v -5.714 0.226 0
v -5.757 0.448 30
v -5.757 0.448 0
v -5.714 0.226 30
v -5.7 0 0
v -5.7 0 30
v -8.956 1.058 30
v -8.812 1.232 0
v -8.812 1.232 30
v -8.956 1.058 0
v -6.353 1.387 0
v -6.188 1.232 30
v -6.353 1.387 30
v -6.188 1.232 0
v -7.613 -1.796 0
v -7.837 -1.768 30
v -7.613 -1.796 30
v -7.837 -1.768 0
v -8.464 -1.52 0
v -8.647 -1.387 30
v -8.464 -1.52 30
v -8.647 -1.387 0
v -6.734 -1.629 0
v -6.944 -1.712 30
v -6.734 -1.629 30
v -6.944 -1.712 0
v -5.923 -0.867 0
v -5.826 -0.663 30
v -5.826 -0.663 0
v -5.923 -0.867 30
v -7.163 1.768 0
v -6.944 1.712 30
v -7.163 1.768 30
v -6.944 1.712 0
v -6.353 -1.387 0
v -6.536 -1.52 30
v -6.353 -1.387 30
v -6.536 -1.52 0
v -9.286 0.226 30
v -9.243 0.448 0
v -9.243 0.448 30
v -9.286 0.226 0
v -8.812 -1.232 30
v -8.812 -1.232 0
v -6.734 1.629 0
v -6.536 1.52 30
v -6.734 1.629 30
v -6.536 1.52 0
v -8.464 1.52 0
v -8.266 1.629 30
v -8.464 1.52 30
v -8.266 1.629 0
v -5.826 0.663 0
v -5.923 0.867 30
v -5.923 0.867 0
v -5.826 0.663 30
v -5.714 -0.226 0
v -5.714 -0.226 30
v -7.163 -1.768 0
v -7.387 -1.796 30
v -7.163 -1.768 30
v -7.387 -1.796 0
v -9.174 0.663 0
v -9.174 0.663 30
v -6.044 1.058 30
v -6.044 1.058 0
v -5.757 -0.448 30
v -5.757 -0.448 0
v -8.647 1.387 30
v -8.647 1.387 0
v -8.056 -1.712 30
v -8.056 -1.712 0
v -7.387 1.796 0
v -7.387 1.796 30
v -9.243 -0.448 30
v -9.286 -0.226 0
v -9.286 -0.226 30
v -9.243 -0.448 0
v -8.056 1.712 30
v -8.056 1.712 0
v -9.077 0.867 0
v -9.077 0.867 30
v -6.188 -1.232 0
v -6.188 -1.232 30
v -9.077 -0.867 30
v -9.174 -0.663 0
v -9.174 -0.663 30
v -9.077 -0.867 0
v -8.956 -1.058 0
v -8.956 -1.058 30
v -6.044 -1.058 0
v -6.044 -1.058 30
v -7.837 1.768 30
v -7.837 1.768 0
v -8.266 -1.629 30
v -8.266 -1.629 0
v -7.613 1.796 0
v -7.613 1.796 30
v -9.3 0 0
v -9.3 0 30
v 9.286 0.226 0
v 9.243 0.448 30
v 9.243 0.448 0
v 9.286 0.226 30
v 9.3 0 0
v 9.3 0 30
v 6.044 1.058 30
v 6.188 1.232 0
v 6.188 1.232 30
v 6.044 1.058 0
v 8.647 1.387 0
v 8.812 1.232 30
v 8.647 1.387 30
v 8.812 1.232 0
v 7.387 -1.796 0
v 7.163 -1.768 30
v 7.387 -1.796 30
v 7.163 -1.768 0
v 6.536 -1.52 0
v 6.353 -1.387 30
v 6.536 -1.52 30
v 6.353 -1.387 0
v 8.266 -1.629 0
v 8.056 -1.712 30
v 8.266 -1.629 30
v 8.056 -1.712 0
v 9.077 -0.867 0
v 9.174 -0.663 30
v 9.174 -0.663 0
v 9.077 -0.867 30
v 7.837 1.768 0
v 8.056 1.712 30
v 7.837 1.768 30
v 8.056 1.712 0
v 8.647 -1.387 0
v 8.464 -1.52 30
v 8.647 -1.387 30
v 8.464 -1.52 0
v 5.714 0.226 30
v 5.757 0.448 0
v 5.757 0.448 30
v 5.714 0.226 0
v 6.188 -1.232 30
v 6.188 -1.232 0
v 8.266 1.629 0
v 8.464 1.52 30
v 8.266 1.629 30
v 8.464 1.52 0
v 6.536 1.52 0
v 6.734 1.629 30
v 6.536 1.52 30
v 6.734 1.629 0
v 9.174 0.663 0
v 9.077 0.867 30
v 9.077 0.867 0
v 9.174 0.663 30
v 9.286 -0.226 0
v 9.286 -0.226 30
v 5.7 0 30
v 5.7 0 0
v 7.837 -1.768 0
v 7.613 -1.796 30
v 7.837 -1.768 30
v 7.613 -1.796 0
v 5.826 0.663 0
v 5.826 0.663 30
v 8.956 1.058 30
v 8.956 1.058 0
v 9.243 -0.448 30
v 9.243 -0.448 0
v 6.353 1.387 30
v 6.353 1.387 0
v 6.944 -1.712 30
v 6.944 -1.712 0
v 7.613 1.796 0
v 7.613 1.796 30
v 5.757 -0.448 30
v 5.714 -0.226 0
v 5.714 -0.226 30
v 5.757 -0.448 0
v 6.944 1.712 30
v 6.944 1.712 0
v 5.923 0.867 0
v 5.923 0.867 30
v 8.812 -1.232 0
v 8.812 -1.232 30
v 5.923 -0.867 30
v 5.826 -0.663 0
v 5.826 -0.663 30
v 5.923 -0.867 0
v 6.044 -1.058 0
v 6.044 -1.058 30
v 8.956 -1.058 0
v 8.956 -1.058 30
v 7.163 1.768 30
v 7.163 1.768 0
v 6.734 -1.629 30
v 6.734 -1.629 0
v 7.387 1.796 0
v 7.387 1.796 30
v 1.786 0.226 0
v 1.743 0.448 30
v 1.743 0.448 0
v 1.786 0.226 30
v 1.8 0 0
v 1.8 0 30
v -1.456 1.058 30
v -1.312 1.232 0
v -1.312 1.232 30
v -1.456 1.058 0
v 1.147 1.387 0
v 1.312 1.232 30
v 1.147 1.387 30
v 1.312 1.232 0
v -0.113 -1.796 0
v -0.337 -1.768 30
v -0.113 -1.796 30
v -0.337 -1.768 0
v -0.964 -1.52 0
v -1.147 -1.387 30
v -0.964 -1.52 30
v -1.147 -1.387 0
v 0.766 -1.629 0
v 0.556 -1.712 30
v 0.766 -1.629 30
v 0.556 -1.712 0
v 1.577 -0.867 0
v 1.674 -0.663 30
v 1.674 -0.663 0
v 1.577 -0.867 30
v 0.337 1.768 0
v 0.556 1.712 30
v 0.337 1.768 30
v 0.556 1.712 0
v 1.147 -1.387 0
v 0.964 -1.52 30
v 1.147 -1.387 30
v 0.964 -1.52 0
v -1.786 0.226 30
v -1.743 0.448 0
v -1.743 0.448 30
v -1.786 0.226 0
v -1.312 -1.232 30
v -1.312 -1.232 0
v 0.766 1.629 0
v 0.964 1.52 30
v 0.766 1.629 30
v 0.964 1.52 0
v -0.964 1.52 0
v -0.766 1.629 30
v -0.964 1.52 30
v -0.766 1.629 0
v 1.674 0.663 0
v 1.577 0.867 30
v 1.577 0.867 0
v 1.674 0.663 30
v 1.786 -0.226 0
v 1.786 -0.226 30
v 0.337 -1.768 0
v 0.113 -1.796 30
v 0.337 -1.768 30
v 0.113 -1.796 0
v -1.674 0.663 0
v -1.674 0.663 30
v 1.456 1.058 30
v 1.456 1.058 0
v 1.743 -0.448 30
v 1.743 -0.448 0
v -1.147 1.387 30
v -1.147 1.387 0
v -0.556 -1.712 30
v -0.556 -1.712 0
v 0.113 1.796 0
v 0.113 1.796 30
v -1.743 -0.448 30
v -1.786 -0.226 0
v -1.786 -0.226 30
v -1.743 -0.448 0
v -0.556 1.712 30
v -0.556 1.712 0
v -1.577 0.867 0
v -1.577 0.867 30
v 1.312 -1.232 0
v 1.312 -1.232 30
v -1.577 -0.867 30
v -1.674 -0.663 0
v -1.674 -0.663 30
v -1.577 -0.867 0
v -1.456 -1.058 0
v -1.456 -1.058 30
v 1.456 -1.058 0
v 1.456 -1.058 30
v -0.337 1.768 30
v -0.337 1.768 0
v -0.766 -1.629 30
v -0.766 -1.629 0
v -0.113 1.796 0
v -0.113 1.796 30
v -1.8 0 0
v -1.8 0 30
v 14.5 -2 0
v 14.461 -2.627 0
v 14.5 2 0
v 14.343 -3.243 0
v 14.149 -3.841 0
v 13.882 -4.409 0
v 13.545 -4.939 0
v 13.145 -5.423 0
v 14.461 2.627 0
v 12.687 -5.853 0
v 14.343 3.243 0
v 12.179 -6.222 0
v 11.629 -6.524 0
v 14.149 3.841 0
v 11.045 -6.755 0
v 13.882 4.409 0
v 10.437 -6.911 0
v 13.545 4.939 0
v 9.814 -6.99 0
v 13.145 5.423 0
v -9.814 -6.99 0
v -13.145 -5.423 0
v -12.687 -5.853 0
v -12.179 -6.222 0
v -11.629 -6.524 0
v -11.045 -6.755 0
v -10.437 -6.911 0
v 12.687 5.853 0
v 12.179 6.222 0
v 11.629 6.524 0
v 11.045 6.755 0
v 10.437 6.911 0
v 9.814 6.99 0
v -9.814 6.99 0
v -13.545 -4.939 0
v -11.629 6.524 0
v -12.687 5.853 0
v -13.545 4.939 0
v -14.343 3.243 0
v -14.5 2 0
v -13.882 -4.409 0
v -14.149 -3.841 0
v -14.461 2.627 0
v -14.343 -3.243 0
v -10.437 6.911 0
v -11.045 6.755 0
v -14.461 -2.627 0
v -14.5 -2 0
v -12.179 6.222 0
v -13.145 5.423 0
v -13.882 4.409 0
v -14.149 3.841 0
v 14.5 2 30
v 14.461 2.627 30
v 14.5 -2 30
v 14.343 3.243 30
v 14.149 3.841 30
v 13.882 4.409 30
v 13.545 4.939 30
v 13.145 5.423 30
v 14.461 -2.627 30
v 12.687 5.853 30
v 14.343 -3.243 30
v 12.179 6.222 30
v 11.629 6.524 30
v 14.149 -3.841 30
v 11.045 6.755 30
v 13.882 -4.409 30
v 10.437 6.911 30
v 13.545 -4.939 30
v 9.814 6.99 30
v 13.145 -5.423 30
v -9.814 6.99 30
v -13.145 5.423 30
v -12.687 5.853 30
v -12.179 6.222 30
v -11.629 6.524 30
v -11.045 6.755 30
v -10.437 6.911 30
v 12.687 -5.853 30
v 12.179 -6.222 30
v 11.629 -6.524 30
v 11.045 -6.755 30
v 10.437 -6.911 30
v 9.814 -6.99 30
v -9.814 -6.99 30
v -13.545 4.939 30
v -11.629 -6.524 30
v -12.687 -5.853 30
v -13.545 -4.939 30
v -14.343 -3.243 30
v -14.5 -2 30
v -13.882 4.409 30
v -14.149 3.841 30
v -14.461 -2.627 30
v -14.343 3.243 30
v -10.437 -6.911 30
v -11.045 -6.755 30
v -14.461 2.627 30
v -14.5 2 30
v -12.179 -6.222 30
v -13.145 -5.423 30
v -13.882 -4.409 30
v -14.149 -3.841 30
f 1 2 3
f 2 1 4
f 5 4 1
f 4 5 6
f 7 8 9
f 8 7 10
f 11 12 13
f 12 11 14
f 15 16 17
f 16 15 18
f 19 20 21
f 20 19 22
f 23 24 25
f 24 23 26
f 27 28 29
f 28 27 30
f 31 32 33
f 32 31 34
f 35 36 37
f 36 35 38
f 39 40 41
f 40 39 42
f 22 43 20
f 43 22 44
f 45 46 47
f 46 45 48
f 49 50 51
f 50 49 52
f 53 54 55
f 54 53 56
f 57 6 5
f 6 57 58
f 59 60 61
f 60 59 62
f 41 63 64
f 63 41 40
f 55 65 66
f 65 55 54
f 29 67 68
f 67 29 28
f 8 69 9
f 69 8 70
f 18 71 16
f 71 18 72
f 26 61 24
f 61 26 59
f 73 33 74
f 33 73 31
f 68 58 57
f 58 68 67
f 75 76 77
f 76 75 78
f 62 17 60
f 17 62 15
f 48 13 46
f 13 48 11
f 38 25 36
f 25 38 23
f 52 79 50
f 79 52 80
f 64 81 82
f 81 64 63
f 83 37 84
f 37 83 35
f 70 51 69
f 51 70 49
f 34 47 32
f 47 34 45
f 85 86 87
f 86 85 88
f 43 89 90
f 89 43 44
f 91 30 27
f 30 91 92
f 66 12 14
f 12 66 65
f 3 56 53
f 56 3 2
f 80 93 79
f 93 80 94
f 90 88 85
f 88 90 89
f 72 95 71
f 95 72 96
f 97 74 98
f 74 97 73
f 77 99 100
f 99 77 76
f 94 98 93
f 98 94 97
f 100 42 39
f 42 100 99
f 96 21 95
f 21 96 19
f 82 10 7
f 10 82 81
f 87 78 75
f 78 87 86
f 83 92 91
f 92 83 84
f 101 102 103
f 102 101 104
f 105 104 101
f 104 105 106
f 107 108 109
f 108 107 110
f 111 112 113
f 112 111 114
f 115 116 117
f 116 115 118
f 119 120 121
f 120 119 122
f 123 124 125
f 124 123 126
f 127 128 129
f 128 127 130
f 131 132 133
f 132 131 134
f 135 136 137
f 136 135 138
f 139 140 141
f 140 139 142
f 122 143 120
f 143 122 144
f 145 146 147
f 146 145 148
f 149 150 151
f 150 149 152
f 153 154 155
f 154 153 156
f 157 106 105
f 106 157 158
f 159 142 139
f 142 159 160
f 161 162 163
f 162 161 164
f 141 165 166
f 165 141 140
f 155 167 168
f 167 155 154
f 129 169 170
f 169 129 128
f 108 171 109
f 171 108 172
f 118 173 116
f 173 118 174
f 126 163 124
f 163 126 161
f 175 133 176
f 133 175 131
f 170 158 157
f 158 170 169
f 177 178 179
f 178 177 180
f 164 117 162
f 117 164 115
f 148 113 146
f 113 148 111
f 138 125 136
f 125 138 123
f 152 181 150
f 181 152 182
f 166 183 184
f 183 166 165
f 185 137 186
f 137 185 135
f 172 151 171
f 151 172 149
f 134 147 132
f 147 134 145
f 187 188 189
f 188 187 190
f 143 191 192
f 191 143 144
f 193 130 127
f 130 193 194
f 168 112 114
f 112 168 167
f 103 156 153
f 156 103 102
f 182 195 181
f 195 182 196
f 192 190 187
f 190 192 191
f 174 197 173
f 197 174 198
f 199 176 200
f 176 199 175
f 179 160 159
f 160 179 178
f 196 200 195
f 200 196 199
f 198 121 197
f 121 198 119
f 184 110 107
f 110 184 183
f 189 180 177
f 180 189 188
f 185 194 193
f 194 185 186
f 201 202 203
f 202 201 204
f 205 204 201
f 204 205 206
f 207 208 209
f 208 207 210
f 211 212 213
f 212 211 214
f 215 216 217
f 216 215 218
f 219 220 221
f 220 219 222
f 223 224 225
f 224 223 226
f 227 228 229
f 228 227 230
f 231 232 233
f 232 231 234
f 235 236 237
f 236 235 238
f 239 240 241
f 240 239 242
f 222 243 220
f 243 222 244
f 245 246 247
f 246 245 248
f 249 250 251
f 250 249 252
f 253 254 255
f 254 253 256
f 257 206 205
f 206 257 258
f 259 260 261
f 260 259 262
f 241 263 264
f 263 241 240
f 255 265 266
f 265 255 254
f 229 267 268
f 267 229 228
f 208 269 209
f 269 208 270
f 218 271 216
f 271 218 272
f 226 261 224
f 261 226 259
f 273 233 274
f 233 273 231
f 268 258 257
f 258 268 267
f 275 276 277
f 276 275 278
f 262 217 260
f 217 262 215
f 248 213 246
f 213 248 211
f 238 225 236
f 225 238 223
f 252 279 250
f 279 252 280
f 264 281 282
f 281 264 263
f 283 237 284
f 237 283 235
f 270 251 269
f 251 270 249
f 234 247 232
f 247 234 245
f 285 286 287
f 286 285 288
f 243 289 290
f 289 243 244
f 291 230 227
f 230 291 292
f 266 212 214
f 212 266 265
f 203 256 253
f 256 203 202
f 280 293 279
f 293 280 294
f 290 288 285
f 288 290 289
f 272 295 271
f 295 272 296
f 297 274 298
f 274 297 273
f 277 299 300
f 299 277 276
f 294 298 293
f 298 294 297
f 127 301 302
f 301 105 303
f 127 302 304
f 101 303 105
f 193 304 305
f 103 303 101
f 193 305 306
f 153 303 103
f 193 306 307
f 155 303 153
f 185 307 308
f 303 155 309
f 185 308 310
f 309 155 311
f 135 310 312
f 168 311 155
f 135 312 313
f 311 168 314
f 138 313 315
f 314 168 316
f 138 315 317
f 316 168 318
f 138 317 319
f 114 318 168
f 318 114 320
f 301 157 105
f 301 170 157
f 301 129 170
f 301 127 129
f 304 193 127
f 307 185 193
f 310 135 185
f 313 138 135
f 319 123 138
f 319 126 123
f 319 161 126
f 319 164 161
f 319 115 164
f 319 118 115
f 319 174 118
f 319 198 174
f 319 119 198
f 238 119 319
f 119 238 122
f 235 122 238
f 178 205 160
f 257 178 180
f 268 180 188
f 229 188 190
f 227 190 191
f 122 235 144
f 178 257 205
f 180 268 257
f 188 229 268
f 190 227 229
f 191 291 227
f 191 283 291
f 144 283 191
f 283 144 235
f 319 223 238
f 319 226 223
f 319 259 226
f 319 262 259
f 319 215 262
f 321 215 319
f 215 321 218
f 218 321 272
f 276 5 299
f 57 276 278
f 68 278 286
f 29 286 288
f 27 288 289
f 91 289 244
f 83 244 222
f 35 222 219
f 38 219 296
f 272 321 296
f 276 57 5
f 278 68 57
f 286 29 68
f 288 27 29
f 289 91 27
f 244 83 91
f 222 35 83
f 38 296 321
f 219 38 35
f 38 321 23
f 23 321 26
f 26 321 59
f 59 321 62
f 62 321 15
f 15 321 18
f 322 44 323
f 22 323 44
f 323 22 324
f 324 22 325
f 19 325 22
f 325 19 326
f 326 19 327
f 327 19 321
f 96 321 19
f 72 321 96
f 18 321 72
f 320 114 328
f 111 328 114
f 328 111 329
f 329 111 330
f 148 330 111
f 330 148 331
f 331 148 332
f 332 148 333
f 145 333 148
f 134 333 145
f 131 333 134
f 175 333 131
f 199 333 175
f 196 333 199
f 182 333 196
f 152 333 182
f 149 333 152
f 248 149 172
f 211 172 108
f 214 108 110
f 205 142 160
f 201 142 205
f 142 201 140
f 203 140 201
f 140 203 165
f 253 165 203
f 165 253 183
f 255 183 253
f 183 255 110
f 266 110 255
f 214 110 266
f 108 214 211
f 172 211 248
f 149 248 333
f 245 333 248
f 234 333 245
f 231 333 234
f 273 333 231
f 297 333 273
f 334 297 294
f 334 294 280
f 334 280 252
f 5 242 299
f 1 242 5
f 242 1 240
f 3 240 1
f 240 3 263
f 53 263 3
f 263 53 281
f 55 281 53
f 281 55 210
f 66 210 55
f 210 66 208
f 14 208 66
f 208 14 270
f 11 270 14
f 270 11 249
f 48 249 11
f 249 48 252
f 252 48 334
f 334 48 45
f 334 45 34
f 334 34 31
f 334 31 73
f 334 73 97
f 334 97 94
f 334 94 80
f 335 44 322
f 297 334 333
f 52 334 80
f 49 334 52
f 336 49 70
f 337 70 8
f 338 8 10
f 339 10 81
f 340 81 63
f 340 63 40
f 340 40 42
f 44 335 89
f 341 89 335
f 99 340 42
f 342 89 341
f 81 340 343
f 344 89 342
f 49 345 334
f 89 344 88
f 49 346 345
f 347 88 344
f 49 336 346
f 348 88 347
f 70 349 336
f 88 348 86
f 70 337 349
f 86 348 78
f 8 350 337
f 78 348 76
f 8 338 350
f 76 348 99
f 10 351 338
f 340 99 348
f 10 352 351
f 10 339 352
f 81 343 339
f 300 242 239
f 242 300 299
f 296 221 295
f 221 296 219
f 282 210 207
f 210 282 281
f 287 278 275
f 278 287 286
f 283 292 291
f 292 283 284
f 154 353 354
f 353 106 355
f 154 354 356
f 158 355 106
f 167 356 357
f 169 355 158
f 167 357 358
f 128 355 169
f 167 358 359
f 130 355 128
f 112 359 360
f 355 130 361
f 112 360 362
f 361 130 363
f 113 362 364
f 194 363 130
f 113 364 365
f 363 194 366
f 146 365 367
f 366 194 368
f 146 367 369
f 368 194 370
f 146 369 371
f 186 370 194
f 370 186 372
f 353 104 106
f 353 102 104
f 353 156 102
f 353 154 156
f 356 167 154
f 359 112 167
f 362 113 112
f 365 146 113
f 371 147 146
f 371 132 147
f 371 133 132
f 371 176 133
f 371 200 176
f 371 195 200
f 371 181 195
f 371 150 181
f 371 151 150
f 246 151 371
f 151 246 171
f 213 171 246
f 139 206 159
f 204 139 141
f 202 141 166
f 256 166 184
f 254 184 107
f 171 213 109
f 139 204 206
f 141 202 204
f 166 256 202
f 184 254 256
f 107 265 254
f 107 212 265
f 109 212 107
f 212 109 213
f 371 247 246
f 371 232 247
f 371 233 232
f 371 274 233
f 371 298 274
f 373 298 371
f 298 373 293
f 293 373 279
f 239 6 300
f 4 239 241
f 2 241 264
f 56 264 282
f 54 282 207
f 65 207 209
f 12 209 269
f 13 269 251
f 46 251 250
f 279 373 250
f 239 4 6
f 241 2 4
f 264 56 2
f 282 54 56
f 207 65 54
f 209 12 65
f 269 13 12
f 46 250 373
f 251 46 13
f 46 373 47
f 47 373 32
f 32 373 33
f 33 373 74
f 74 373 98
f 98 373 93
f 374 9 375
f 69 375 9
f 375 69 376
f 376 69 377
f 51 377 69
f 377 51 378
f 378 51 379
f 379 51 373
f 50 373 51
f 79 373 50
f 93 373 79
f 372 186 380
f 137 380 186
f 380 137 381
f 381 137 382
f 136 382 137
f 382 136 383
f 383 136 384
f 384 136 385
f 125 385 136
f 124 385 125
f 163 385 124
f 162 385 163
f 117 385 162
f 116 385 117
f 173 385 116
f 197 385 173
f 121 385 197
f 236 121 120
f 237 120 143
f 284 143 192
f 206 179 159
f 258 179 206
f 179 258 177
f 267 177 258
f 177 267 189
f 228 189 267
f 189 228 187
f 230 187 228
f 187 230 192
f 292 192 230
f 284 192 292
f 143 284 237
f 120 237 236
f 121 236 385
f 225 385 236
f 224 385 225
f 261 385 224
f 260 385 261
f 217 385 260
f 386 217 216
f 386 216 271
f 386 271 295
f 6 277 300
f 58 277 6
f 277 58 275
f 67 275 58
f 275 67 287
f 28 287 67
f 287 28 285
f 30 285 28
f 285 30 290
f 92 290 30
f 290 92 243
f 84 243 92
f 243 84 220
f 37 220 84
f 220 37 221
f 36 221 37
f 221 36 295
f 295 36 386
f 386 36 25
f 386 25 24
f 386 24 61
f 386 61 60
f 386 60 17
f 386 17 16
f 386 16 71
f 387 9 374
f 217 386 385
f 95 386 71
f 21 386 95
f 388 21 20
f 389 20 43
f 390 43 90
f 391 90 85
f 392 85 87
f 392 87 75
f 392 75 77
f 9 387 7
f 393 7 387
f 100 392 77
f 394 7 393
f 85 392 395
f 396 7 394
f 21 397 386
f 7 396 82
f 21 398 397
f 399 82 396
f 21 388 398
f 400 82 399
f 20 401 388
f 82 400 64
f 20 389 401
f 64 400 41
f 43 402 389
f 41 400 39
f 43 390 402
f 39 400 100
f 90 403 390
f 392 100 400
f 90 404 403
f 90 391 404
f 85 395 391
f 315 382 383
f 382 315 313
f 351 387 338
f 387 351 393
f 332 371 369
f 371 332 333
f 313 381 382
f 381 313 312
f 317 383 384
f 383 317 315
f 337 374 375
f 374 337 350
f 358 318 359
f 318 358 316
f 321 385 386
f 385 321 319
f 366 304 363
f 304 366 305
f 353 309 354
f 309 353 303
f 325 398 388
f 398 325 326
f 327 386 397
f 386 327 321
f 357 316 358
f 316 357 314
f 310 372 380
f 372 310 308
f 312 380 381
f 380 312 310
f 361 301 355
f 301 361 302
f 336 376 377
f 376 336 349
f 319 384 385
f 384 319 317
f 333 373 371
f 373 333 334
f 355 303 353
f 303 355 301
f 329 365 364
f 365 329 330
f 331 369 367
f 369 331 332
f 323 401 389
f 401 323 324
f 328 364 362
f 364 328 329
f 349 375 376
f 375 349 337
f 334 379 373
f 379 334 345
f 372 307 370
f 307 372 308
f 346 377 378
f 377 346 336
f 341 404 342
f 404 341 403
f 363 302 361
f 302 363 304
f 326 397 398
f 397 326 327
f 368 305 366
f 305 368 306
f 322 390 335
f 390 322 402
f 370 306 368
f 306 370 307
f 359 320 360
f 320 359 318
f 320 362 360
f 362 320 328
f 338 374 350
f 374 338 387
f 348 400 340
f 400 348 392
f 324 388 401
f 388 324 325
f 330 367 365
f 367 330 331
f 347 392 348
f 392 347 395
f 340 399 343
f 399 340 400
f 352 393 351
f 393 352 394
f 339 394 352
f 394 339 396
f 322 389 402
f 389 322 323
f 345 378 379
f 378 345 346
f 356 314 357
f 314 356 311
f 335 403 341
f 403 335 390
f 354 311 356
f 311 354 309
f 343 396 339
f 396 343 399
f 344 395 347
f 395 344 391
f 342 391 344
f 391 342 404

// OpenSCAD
$fn = 50;


difference() {
	union() {
		hull() {
			translate(v = [-9.5000000000, 2.0000000000, 0]) {
				cylinder(h = 30, r = 5);
			}
			translate(v = [9.5000000000, 2.0000000000, 0]) {
				cylinder(h = 30, r = 5);
			}
			translate(v = [-9.5000000000, -2.0000000000, 0]) {
				cylinder(h = 30, r = 5);
			}
			translate(v = [9.5000000000, -2.0000000000, 0]) {
				cylinder(h = 30, r = 5);
			}
		}
	}
	union() {
		translate(v = [-7.5000000000, 0.0000000000, -100.0000000000]) {
			cylinder(h = 200, r = 1.8000000000);
		}
		translate(v = [7.5000000000, 0.0000000000, -100.0000000000]) {
			cylinder(h = 200, r = 1.8000000000);
		}
		translate(v = [-7.5000000000, 0.0000000000, 0]) {
			cylinder(h = 30, r = 1.8000000000);
		}
		cylinder(h = 30, r = 1.8000000000);
		translate(v = [7.5000000000, 0.0000000000, 0]) {
			cylinder(h = 30, r = 1.8000000000);
		}
		translate(v = [-7.5000000000, 0.0000000000, 0]) {
			cylinder(h = 30, r = 1.8000000000);
		}
		cylinder(h = 30, r = 1.8000000000);
		translate(v = [7.5000000000, 0.0000000000, 0]) {
			cylinder(h = 30, r = 1.8000000000);
		}
		translate(v = [-7.5000000000, 0.0000000000, 0]) {
			cylinder(h = 30, r = 1.8000000000);
		}
		cylinder(h = 30, r = 1.8000000000);
		translate(v = [7.5000000000, 0.0000000000, 0]) {
			cylinder(h = 30, r = 1.8000000000);
		}
	}
}
